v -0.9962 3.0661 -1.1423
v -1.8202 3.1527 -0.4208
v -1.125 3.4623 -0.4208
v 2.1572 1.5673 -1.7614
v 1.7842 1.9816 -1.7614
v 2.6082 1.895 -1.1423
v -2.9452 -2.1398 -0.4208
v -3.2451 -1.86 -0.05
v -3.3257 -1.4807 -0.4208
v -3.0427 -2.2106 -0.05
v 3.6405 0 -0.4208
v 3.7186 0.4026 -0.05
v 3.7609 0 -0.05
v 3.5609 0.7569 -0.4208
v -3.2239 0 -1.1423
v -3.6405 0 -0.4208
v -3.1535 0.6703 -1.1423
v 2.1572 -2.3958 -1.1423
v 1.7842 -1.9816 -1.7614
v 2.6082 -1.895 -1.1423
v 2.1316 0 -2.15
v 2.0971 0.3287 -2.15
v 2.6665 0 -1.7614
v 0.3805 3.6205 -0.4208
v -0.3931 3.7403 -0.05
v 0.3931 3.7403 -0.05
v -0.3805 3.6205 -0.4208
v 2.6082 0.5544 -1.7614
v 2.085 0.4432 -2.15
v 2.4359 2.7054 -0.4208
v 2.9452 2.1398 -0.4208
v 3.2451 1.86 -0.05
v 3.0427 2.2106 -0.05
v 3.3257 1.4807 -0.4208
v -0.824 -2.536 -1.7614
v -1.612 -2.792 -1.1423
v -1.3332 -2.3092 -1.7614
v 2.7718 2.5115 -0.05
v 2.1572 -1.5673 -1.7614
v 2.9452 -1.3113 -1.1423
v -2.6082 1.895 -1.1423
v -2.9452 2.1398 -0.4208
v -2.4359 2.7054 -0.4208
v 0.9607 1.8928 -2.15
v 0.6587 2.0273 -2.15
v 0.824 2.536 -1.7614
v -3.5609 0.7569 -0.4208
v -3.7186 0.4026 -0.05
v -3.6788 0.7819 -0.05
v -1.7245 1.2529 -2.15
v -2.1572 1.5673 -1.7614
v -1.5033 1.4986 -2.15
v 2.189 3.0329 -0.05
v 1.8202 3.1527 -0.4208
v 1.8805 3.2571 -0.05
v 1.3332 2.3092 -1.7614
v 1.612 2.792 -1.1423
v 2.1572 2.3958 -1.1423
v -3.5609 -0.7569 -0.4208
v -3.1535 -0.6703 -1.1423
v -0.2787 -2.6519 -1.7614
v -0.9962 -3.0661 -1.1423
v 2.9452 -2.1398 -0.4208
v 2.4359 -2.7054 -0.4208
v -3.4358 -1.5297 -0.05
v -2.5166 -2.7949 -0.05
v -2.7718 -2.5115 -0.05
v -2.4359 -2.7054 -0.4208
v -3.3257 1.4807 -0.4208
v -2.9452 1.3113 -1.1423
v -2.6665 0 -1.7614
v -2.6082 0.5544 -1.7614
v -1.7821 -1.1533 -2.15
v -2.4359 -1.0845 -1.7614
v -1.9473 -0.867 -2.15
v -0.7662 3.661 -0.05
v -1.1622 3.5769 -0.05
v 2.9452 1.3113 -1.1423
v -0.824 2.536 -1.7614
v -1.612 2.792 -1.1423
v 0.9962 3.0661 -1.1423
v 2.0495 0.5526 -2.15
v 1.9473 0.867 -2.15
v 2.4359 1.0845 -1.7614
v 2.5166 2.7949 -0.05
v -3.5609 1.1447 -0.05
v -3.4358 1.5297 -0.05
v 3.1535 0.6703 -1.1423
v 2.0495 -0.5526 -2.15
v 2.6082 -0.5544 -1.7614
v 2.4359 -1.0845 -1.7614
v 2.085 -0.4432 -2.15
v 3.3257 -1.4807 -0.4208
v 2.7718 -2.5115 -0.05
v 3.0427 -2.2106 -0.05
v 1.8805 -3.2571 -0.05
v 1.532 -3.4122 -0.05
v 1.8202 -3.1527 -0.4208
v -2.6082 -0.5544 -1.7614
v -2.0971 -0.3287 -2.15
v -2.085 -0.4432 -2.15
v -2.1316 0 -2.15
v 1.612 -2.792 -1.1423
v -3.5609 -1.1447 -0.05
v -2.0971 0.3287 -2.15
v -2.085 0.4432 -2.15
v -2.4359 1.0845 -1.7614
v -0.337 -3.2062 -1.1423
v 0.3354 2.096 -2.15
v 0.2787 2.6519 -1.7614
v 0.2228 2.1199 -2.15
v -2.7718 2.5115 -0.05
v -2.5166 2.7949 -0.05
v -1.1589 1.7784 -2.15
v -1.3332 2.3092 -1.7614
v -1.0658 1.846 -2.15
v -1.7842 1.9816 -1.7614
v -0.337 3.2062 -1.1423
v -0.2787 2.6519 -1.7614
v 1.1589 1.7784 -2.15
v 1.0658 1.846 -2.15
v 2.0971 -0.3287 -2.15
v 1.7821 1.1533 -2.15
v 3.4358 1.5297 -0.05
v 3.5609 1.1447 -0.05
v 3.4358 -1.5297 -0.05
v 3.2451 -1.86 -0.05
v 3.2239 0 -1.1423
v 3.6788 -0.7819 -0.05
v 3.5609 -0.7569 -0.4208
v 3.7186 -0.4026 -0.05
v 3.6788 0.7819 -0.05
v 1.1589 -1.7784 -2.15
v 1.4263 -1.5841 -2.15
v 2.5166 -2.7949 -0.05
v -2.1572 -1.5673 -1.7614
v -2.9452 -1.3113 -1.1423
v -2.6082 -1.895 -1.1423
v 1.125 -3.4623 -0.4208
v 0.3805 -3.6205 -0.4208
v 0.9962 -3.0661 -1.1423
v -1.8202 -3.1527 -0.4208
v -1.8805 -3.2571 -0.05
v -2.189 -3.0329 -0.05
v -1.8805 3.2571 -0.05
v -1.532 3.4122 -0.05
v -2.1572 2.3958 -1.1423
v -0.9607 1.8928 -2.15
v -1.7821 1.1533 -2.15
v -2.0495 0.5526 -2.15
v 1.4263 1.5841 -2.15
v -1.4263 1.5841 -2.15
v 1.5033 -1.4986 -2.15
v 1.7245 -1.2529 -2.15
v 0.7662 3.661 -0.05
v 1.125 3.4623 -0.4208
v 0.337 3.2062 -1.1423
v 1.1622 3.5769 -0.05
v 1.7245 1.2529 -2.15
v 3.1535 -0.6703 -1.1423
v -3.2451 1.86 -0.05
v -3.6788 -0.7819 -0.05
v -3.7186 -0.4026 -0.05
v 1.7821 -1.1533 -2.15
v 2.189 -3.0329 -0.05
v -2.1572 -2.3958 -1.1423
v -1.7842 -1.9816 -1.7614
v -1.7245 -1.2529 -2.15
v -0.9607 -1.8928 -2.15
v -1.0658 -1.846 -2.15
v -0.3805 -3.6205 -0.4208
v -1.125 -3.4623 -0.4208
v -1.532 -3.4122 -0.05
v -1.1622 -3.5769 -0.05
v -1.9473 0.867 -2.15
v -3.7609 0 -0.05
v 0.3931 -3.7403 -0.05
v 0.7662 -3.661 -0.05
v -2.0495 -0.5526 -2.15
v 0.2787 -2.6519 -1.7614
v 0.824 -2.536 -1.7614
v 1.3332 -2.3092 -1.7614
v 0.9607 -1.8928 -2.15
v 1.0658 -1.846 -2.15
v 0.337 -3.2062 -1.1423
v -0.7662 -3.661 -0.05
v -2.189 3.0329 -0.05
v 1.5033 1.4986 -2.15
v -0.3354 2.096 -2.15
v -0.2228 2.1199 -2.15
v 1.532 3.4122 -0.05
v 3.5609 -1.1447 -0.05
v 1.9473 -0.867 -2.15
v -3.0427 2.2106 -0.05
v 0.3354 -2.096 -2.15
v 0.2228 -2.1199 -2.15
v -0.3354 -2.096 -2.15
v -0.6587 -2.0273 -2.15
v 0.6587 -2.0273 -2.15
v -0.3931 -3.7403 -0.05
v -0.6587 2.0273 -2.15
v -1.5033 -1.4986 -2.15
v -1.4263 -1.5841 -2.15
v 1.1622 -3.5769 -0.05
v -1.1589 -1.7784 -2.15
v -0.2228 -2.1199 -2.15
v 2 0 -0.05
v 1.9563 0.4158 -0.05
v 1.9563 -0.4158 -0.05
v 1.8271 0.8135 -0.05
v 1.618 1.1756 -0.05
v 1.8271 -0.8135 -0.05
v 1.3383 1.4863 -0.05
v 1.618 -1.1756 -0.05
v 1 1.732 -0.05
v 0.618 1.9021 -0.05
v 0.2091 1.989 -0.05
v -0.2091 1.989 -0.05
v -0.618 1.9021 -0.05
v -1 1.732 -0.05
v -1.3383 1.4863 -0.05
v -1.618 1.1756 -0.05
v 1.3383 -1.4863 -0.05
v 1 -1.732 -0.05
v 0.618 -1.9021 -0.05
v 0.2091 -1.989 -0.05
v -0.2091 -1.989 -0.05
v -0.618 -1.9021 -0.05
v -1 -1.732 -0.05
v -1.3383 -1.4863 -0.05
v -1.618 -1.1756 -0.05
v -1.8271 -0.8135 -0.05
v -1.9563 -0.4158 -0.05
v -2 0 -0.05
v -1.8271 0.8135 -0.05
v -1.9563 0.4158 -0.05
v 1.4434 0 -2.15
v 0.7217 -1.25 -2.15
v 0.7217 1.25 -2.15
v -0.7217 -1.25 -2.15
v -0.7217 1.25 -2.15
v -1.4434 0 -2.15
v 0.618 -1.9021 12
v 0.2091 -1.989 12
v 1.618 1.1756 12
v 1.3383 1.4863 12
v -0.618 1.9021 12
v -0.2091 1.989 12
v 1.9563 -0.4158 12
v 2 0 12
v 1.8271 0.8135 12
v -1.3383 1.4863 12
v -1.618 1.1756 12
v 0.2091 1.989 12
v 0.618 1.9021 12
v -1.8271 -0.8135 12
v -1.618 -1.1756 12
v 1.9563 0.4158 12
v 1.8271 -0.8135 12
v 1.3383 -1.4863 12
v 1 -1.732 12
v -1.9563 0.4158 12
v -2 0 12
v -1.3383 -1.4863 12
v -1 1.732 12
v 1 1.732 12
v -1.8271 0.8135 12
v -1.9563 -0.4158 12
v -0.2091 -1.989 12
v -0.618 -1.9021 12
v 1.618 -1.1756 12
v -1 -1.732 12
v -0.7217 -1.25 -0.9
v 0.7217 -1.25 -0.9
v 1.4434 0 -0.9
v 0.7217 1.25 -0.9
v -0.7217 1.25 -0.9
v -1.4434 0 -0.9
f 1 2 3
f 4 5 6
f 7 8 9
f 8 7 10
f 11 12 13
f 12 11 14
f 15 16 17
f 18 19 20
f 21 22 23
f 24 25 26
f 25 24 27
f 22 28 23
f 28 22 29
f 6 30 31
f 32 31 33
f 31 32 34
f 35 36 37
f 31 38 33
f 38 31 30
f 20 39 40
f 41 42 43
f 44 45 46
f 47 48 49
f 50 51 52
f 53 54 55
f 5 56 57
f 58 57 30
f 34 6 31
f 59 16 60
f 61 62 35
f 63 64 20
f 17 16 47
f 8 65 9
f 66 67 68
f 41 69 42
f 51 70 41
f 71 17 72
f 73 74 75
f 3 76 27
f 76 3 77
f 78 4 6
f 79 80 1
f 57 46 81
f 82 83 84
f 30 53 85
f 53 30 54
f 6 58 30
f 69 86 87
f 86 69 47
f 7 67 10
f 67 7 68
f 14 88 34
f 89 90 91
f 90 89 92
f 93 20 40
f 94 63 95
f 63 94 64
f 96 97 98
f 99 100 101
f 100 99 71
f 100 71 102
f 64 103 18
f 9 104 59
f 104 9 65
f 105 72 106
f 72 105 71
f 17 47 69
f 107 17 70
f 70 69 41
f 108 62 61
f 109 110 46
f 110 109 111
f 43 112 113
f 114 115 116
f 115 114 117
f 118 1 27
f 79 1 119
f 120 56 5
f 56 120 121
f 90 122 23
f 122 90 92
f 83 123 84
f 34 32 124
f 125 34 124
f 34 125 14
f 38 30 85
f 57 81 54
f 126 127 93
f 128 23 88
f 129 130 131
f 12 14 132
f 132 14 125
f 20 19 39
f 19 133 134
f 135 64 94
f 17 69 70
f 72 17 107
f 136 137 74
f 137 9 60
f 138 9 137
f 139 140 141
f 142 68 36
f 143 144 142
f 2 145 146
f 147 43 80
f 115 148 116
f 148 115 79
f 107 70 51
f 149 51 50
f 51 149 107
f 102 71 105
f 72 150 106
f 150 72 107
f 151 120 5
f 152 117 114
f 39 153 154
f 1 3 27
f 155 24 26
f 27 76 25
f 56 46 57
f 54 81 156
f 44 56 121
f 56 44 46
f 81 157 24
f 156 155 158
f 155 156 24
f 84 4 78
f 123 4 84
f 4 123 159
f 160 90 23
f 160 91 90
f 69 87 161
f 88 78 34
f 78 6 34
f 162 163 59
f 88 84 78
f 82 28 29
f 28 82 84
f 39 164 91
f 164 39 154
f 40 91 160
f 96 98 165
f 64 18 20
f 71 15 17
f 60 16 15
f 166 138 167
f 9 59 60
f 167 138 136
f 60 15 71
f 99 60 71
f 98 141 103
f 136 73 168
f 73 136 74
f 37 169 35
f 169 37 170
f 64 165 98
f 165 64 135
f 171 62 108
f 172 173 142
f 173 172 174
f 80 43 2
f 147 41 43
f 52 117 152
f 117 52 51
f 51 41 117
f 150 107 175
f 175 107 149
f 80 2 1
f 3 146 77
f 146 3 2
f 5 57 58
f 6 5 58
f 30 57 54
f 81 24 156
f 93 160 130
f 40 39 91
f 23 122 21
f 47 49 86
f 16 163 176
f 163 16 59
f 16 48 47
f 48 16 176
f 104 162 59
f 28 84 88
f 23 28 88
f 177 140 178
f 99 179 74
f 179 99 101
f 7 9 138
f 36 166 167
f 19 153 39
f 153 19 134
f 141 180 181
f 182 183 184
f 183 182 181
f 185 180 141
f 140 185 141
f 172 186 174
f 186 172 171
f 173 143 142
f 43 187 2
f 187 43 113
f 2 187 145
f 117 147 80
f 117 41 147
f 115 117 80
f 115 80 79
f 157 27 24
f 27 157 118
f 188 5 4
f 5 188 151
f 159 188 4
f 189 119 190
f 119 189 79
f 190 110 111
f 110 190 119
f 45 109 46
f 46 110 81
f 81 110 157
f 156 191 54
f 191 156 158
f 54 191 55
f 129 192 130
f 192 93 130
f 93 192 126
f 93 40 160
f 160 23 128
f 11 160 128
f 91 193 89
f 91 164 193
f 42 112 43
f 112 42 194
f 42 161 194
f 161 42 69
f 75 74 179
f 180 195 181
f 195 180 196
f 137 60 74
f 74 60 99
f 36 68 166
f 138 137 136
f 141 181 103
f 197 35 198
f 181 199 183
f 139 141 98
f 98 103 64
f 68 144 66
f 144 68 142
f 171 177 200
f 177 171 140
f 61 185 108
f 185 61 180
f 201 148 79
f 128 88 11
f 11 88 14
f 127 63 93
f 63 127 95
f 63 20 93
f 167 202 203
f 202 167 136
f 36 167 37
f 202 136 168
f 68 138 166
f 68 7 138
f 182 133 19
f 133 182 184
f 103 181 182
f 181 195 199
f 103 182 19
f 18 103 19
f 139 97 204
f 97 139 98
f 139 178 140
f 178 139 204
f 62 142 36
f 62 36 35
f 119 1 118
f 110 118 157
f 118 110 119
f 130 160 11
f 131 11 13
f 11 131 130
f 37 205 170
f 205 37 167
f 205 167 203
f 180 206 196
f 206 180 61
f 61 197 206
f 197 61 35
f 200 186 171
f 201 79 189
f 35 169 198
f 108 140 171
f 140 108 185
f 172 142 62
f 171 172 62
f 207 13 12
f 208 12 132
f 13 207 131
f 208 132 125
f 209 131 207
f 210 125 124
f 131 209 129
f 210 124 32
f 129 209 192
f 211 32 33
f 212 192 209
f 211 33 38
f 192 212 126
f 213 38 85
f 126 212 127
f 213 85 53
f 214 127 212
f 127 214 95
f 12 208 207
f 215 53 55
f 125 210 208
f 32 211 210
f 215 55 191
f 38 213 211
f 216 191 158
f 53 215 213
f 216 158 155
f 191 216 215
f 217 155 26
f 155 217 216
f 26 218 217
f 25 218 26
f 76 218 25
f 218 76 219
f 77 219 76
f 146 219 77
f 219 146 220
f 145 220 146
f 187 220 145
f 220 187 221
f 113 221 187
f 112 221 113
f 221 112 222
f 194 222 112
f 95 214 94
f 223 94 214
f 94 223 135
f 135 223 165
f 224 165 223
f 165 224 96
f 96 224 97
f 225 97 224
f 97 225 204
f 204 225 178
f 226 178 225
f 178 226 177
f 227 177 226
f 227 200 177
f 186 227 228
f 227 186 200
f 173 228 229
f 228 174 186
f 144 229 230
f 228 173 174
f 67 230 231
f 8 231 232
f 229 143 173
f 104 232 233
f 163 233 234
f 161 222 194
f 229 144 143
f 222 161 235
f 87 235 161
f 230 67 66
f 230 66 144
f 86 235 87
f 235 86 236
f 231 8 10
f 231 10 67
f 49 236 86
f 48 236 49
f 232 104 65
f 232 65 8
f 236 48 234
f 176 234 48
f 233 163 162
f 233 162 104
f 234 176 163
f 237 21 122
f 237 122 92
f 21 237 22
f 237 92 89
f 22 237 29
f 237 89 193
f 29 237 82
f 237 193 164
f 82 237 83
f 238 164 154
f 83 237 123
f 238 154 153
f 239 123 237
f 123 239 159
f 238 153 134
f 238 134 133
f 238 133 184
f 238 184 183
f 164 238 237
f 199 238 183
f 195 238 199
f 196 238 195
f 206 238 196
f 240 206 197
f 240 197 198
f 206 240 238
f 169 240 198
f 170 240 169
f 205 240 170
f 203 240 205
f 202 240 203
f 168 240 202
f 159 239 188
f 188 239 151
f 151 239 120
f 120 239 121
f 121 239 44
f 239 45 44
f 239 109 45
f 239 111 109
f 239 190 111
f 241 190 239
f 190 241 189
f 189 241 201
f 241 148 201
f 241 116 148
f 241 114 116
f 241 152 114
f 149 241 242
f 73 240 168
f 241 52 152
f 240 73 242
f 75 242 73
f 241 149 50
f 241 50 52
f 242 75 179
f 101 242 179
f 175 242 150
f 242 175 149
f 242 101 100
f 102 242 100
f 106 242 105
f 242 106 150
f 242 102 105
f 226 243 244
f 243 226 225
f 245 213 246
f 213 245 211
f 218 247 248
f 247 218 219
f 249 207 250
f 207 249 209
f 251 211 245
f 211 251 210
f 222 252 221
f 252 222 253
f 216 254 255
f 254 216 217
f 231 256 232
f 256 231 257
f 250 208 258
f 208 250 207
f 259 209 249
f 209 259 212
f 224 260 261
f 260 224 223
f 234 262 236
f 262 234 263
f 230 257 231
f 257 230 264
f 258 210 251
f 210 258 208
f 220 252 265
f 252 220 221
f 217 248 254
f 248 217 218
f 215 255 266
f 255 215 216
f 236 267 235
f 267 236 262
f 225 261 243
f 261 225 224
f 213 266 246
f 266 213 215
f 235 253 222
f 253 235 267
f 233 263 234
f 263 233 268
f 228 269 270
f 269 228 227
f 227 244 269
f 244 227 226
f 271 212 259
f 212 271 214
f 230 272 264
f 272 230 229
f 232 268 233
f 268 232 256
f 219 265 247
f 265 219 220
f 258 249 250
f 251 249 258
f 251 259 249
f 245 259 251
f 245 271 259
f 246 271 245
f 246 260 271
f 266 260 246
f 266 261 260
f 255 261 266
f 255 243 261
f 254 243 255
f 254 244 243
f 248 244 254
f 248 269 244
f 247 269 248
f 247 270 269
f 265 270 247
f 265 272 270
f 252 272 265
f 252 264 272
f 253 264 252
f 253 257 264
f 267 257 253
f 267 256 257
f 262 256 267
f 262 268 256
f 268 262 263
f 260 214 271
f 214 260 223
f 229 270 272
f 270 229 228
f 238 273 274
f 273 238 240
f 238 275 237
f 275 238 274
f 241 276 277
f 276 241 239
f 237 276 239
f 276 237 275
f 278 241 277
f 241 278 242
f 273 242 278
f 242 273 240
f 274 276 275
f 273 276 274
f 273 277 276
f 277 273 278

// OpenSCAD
/*
   Copyright 2018 Scott Bezek and the splitflap contributors

   Licensed under the Apache License, Version 2.0 (the "License");
   you may not use this file except in compliance with the License.
   You may obtain a copy of the License at

       http://www.apache.org/licenses/LICENSE-2.0

   Unless required by applicable law or agreed to in writing, software
   distributed under the License is distributed on an "AS IS" BASIS,
   WITHOUT WARRANTIES OR CONDITIONS OF ANY KIND, either express or implied.
   See the License for the specific language governing permissions and
   limitations under the License.
*/

module roughM4_7380(length) {
    eps = 0.1;
    thread_diameter = 4;
    head_diameter = 7.6;
    head_length = 2.2;
    driving_depth = 1.3;
    driving_apothem = 2.5/2;
    driving_radius = driving_apothem / cos(180/6);

    sphere_offset = 1.2;  // Just a guess
    sphere_radius = sqrt(sphere_offset*sphere_offset + (head_diameter/2)*(head_diameter/2));


    difference() {
        union() {
            translate([0, 0, -eps]) {
                cylinder(h=length+eps, d=thread_diameter, $fn=30);
            }
            difference() {
                translate([0, 0, sphere_offset]) {
                    sphere(sphere_radius, $fn=30);
                }
                translate([0, 0, sphere_radius]) {
                    cube([sphere_radius*2 + eps, sphere_radius*2 + eps, sphere_radius*2 + eps], center=true);
                }
                translate([0, 0, -sphere_radius - head_length]) {
                    cube([sphere_radius*2 + eps, sphere_radius*2 + eps, sphere_radius*2 + eps], center=true);
                }
            }
        }
        translate([0, 0, -head_length-eps]) {
            cylinder(h=driving_depth+eps, r=driving_radius, $fn=6);
        }
    }
}

roughM4_7380(12);

        module color_selector(c) {
            precision = 0.0000001;  // arbitrary
            function compare_floats(x, y, i=0) = 
                  (len(x) != len(y)) ? false  // if arrays differ in length, they can't be equal
                : (i >= len(x)) ? true  // if we've hit the end of the arrays without issue, we're equal
                : (x[i] - precision <= y[i]) && x[i] + precision >= y[i]
                    ? compare_floats(x, y, i+1)
                    : false;  // not equal, short circuit

            if (c == [0.76, 0.6, 0.42] || compare_floats(c, [0.76, 0.6, 0.42]))
                children();
        }
                    
